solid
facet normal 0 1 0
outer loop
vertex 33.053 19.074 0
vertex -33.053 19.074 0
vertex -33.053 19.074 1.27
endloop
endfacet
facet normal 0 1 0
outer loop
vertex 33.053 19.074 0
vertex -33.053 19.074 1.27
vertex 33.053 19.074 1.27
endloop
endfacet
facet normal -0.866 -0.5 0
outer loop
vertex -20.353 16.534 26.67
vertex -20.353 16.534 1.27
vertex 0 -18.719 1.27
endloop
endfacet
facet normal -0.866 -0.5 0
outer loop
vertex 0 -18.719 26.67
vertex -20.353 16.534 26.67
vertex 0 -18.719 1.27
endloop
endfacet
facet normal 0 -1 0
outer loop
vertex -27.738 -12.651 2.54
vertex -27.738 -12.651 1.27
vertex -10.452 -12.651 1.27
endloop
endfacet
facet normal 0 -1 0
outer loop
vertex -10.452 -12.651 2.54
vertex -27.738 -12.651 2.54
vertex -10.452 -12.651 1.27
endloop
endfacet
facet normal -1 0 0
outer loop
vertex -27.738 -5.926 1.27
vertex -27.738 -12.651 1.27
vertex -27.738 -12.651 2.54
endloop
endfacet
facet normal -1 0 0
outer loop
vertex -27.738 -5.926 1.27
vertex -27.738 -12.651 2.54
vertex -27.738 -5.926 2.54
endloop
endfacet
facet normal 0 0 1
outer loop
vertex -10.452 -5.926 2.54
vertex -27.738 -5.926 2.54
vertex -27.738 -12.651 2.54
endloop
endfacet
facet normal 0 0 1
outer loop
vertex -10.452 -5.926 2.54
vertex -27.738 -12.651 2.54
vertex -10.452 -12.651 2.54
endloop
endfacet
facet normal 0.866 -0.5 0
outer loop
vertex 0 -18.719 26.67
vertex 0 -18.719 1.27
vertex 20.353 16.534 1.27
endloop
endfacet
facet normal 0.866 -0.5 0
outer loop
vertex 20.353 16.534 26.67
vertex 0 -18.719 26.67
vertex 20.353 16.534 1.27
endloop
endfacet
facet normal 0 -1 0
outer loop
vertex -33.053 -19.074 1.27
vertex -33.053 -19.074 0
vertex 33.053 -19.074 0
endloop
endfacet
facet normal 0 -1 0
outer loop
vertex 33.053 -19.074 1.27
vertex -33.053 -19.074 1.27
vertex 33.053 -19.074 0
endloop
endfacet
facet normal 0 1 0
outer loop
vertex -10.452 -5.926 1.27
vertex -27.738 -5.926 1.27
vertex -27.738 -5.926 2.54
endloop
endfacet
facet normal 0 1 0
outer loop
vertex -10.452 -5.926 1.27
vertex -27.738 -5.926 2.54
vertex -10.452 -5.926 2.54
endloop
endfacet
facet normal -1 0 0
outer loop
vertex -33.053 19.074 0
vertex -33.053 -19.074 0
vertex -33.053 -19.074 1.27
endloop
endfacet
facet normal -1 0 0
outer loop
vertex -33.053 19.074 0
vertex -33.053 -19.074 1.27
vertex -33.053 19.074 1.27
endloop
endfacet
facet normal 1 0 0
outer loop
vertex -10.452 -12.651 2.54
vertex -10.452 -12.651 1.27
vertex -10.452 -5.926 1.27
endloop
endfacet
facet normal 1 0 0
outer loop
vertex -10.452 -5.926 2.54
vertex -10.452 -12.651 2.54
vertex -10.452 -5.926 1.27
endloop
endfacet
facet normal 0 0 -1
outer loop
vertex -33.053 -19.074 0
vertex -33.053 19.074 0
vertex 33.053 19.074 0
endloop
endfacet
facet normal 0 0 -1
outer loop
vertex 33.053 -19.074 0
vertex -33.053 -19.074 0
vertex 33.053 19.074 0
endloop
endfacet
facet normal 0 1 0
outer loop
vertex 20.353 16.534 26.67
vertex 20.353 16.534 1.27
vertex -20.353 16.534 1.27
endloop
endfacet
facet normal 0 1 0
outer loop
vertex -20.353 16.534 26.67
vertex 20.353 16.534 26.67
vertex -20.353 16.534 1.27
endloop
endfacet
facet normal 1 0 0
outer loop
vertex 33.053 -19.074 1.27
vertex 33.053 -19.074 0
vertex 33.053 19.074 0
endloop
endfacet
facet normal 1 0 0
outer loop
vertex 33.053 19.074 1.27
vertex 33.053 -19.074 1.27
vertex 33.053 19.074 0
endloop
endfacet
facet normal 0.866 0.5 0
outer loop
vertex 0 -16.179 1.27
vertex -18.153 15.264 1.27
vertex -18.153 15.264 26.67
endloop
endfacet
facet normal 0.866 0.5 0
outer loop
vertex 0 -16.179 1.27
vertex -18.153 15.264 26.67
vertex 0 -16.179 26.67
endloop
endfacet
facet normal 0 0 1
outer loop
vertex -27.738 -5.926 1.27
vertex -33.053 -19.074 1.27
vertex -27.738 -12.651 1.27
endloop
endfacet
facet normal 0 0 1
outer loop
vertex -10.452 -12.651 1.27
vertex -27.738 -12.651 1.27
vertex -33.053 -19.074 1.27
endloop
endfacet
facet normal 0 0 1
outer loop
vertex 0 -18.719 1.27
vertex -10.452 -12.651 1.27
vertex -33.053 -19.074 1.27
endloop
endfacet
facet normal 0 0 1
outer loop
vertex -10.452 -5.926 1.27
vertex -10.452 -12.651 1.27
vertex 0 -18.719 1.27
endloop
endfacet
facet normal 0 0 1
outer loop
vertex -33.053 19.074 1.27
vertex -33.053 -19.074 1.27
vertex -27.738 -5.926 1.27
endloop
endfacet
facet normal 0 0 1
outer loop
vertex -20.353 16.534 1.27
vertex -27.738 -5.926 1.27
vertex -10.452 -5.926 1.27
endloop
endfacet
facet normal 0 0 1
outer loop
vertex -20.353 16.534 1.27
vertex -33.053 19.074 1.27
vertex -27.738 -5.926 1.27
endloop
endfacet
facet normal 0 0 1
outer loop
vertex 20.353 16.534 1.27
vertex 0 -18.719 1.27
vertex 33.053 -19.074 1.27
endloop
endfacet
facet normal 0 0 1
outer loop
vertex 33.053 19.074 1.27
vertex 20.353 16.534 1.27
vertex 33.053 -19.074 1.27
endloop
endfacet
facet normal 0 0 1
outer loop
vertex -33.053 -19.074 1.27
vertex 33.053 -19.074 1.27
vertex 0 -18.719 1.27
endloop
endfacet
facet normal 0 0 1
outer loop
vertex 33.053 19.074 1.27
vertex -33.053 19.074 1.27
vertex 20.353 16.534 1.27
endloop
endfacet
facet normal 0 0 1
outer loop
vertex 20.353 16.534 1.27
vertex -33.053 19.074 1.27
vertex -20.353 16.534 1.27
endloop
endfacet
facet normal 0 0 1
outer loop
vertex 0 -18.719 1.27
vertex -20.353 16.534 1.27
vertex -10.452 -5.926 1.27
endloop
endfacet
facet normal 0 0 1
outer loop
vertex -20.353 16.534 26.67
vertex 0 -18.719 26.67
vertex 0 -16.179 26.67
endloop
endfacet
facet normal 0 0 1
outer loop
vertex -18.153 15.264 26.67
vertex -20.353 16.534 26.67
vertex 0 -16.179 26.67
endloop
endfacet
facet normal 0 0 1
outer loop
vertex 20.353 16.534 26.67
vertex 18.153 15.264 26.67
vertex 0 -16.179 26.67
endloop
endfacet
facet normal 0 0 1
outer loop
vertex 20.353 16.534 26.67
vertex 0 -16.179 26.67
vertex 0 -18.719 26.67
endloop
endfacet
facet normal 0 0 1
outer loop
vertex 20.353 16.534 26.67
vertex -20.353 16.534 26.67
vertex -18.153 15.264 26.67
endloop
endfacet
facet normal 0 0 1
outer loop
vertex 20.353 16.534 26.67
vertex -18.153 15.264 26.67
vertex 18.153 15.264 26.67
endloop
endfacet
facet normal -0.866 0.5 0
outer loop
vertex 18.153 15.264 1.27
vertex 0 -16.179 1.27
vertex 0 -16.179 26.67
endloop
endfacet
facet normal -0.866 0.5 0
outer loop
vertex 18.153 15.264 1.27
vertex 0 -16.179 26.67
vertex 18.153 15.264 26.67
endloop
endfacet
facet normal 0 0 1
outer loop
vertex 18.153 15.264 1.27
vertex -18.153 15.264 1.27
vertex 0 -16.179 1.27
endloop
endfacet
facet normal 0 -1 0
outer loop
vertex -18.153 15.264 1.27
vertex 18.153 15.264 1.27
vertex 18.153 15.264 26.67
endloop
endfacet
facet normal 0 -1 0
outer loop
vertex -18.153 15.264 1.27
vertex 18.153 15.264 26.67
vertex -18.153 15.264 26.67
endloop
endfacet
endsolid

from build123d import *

# Parameters (mm, degrees)
F0_W        = 66.1063343287
F0_H        = 38.1483472884
F1_DEPTH    = 1.27
F3_DEPTH    = 25.4
F4_T        = 1.27
F4_T3_DEPTH = 43.2463343287
F4_T5_DEPTH = 43.2463343287
F4_T7_DEPTH = 43.2463343287
F5_W        = 17.286144197
F5_H        = 6.7250733264
F6_DEPTH    = 1.27


# Not quite as in the source:
# - a shell that OpenCascade refuses in one call is made with other operations: the cavity is built on its own and cut out


with BuildPart() as f1:
    # F0 (on Top) → F1 (new body)
    with BuildSketch(Plane.XY):
        Rectangle(F0_W, F0_H)
    extrude(amount=F1_DEPTH)

    # F2 (on face) → F3 (join)
    with BuildSketch(Plane.XY.offset(1.27)):
        Polygon((20.3531671643, 16.5341736442), (-20.3531671643, 16.5341736442), (0, -18.7185459794), align=None)
    extrude(amount=F3_DEPTH)

    # F4: shell of thickness 1.27, made by hand


with BuildPart() as f4_core1:
    # F4_t2: copy of F1
    add(f1.part)

    # the walls: a layer under each face that stays
    f4_faces = [f4_core1.faces().sort_by_distance(p)[0] for p in [
        (33.0531671643, 0, 0.635),
        (0, -19.0741736442, 0.635),
        (0, 19.0741736442, 0.635),
        (0, 0, 0),
        (-22.0354447762, -12.7161157628, 1.27),
        (-33.0531671643, 0, 0.635),
        (0, 16.5341736442, 13.97),
        (-10.1765835822, -1.0921861676, 13.97),
        (10.1765835822, -1.0921861676, 13.97),
    ]]
    thicken(f4_faces, amount=-F4_T, mode=Mode.SUBTRACT)

    # F4_s4 → F4_t3 (cut)
    with BuildSketch(Plane.YZ.offset(-21.6231671643)):
        Polygon((16.5468736442, 1.2827), (16.5341736442, 0), (15.2641736442, 0), (15.2641736442, 1.27), align=None)
    extrude(amount=F4_T3_DEPTH, mode=Mode.SUBTRACT)

    # F4_s6 → F4_t5 (cut)
    with BuildSketch(Plane(origin=(-12.8827989943, 22.3136624018, 0), x_dir=(0, 0, 1), z_dir=(0.5, -0.8660254038, 0))):
        Polygon((1.2827, 9.3719729897), (0, 9.3592729897), (0, 8.0892729897), (1.27, 8.0892729897), align=None)
    extrude(amount=F4_T5_DEPTH, mode=Mode.SUBTRACT)

    # F4_s8 → F4_t7 (cut)
    with BuildSketch(Plane(origin=(-8.74036817, -15.1387617473, 0), x_dir=(0, 0, 1), z_dir=(0.5, 0.8660254038, 0))):
        Polygon((1.2827, 9.3719729897), (0, 9.3592729897), (0, 8.0892729897), (1.27, 8.0892729897), align=None)
    extrude(amount=F4_T7_DEPTH, mode=Mode.SUBTRACT)


with BuildPart() as f1_1:
    add(f1.part)

    # what is left inside the walls is the cavity
    f4_cavity = [f4_core1.part.solids().sort_by_distance(p)[0] for p in [
        (-9.065733, -0.450836, 18.203333),
    ]]
    add(f4_cavity, mode=Mode.SUBTRACT)

    # F5 (on face) → F6 (join)
    with BuildSketch(Plane.XY.offset(1.27)):
        with Locations((-19.0954133868, -9.2882269528)):
            Rectangle(F5_W, F5_H)
    extrude(amount=F6_DEPTH)


solid = f1_1.part
